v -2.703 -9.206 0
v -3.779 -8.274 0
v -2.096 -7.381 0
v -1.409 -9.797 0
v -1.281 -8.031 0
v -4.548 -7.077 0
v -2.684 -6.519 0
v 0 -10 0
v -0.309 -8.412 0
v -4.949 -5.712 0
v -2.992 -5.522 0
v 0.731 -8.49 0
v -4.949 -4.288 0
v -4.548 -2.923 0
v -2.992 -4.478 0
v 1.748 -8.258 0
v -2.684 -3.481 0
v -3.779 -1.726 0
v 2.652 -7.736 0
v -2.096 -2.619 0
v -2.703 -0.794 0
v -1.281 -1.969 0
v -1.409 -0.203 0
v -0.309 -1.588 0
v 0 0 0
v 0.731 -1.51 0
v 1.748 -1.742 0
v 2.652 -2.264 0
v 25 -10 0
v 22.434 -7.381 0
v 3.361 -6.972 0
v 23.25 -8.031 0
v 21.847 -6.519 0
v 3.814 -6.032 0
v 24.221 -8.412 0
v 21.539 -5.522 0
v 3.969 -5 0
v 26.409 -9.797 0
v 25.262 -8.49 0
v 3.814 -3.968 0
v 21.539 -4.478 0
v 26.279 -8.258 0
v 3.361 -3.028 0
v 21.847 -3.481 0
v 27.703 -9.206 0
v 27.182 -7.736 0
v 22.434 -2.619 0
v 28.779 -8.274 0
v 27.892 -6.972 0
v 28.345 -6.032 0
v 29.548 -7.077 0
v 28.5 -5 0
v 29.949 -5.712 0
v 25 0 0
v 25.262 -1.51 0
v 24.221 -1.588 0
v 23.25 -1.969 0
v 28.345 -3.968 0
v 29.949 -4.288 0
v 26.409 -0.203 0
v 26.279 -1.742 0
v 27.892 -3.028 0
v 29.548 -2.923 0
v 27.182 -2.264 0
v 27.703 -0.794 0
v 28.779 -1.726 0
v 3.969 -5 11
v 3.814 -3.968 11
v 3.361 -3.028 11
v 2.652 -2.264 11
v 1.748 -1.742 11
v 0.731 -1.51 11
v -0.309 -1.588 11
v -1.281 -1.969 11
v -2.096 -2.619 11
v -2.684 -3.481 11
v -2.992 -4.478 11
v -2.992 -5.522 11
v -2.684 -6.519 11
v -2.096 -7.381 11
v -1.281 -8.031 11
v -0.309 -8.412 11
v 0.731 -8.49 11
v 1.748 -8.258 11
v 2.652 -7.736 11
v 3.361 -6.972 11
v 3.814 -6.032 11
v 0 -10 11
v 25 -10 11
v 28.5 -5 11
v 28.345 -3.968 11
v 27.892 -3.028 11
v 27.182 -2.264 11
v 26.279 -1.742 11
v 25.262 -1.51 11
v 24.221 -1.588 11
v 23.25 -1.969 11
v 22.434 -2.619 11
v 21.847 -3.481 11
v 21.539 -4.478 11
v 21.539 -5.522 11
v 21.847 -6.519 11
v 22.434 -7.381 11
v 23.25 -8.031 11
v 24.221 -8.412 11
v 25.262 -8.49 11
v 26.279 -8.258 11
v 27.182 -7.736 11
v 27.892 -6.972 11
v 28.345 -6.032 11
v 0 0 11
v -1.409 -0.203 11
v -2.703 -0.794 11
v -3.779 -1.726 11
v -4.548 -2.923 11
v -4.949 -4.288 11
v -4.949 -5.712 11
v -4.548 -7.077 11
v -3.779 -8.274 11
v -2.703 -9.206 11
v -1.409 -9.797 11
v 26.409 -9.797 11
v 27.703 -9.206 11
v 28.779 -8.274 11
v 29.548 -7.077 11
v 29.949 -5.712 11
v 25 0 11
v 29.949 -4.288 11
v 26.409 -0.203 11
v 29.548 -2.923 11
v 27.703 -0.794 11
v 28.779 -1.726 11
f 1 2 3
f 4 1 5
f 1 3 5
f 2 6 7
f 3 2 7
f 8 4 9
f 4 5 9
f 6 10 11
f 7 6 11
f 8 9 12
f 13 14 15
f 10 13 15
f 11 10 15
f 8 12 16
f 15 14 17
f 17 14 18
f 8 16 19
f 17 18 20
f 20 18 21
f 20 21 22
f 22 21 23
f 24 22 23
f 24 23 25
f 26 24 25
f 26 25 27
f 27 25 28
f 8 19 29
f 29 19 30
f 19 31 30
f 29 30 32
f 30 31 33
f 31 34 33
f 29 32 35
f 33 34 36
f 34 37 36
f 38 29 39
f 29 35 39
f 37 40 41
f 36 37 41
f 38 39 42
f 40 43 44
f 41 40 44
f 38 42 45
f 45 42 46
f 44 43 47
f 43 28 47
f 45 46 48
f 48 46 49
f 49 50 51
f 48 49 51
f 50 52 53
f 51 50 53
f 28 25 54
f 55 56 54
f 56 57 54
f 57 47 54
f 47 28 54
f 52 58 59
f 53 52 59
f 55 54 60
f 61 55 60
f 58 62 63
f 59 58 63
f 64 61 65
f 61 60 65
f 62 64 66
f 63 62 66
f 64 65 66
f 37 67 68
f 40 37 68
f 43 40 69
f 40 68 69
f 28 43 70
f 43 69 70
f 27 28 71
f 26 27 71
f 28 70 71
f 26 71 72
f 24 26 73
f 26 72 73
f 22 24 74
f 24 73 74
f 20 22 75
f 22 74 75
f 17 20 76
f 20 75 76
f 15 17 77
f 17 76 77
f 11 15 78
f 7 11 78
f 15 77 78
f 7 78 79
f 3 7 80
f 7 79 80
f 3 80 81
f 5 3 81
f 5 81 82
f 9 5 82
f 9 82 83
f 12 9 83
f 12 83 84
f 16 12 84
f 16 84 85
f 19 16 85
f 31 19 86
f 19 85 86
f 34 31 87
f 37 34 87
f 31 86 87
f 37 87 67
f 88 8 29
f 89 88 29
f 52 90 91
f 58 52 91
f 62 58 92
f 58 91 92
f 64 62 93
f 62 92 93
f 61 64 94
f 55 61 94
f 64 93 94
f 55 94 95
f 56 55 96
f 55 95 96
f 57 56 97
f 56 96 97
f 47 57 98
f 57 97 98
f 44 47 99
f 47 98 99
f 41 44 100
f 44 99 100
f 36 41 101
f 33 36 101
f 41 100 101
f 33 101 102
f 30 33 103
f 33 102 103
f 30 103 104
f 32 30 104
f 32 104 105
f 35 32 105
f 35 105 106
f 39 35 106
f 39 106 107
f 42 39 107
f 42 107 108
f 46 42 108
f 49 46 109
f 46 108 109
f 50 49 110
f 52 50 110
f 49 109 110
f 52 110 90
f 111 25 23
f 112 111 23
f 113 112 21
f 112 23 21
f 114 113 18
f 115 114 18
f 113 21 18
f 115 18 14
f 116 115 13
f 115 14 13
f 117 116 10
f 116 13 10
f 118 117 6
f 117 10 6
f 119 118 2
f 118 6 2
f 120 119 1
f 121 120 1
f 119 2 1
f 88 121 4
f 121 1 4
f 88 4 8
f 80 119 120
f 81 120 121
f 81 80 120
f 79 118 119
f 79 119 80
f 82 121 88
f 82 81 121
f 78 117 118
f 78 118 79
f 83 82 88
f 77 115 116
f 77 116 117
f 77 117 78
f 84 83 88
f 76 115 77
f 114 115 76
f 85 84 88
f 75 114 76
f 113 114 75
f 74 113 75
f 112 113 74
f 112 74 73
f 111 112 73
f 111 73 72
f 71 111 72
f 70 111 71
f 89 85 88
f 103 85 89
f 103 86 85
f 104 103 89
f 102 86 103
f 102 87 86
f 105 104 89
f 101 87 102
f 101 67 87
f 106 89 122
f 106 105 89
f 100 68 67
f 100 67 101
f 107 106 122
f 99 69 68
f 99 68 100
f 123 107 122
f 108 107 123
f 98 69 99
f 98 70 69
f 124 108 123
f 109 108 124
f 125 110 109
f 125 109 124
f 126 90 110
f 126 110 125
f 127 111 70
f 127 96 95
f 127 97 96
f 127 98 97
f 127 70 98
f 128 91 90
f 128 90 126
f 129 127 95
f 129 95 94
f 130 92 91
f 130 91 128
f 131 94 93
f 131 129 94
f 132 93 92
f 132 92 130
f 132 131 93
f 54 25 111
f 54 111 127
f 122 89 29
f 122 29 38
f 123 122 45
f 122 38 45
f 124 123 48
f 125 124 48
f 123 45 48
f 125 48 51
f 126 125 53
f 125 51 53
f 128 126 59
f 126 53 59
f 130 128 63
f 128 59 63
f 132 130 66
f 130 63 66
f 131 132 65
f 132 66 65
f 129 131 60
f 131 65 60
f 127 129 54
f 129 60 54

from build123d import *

# Parameters (mm, degrees)
SKETCH1_R           = 5
SKETCH1_W           = 25
SKETCH1_H           = 10
BOSS_EXTRUDE1_DEPTH = 11
SKETCH2_R           = 3.5
CUT_EXTRUDE1_DEPTH  = 11


with BuildPart() as part:
    # Sketch1 → Boss-Extrude1 (new body)
    with BuildSketch(Plane.XY):
        with Locations((25, -5)):
            Circle(SKETCH1_R)
        with Locations((0, -5)):
            Circle(SKETCH1_R)
        with Locations((12.5, -5)):
            Rectangle(SKETCH1_W, SKETCH1_H)
    extrude(amount=BOSS_EXTRUDE1_DEPTH)

    # Sketch2 → Cut-Extrude1 (cut)
    with BuildSketch(Plane.XY.offset(11)):
        with Locations((0.469346028, -5)):
            Circle(SKETCH2_R)
        with Locations((25, -5)):
            Circle(SKETCH2_R)
    extrude(amount=-CUT_EXTRUDE1_DEPTH, mode=Mode.SUBTRACT)


solid = part.part
